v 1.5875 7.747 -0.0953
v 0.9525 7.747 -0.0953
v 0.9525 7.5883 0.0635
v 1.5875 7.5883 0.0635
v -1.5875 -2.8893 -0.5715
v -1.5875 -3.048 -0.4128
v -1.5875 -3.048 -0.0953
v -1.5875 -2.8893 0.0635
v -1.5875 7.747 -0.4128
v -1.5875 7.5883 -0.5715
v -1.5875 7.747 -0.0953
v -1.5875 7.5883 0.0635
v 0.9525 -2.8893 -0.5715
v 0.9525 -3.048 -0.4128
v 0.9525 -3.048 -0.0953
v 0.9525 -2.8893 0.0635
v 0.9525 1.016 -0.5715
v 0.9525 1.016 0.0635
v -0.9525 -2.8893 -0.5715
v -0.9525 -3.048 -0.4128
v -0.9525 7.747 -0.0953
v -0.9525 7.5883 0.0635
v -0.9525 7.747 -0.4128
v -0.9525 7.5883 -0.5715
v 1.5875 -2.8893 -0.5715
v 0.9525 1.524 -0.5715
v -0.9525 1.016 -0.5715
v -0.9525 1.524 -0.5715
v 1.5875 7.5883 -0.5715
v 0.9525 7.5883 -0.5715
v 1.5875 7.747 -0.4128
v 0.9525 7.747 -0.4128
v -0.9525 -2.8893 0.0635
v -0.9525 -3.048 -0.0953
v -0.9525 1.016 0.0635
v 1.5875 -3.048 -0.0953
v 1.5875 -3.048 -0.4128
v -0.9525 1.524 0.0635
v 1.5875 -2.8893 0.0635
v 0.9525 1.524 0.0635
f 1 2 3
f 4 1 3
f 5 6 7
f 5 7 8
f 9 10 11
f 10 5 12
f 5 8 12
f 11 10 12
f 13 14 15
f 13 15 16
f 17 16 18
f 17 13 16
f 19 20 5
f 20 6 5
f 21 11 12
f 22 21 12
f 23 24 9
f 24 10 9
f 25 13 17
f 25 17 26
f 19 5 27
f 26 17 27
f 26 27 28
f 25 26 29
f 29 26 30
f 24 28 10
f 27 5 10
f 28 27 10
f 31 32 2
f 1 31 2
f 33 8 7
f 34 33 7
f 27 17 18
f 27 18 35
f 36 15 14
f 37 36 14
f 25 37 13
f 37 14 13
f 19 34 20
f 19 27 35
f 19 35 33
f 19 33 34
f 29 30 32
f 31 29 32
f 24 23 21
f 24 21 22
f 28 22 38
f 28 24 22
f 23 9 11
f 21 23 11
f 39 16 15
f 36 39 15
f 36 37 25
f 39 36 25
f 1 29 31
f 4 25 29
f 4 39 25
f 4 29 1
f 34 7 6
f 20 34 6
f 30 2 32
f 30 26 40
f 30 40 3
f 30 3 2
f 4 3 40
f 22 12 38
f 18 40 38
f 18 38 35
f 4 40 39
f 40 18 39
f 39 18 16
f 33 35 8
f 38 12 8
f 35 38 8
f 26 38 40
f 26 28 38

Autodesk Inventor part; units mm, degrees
sketch "Sketch_2" plane through (0, 0, 0) normal (1, 0, 0) x (0, 1, 0)
  line L0 (7.5883, 0.0635) -> (-2.8893, 0.0635)
  line L1 (-2.8893, 0.0635) -> (-3.048, -0.0953)
  line L2 (-3.048, -0.0953) -> (-3.048, -0.4128)
  line L3 (-3.048, -0.4128) -> (-2.8893, -0.5715)
  line L4 (-2.8893, -0.5715) -> (7.5883, -0.5715)
  line L5 (7.5883, -0.5715) -> (7.747, -0.4128)
  line L6 (7.747, -0.4128) -> (7.747, -0.0953)
  line L7 (7.747, -0.0953) -> (7.5883, 0.0635)
extrude "Extrusion1" add sketch "Sketch_2" along normal mid plane 3.175
sketch "Sketch_10" plane through (0, 0, 0) normal (0, 0, 1) x (1, 0, 0)
  line L0 (-3.4925, -3.556) -> (4.1275, -3.556)
  line L1 (4.1275, -3.556) -> (4.1275, -3.048)
  line L2 (4.1275, -3.048) -> (3.4925, -3.048)
  line L3 (3.4925, -3.048) -> (3.4925, 1.016)
  line L4 (3.4925, 1.016) -> (1.5875, 1.016)
  line L5 (1.5875, 1.016) -> (1.5875, -3.048)
  line L6 (1.5875, -3.048) -> (0.9525, -3.048)
  line L7 (0.9525, -3.048) -> (0.9525, 1.016)
  line L8 (0.9525, 1.016) -> (-0.9525, 1.016)
  line L9 (-0.9525, 1.016) -> (-0.9525, -3.048)
  line L10 (-0.9525, -3.048) -> (-1.5875, -3.048)
  line L11 (-1.5875, -3.048) -> (-1.5875, 1.016)
  line L12 (-1.5875, 1.016) -> (-3.4925, 1.016)
  line L13 (-3.4925, 1.016) -> (-3.4925, -3.556)
extrude "Extrusion2" cut sketch "Sketch_10" along normal mid plane 6.096
sketch "Sketch_22" plane through (0, 0, 0) normal (0, 0, 1) x (1, 0, 0)
  line L0 (-3.4925, 9.652) -> (-3.4925, 1.524)
  line L1 (-3.4925, 1.524) -> (-1.5875, 1.524)
  line L2 (-1.5875, 1.524) -> (-1.5875, 9.144)
  line L3 (-1.5875, 9.144) -> (-0.9525, 9.144)
  line L4 (-0.9525, 9.144) -> (-0.9525, 1.524)
  line L5 (-0.9525, 1.524) -> (0.9525, 1.524)
  line L6 (0.9525, 1.524) -> (0.9525, 9.144)
  line L7 (0.9525, 9.144) -> (1.5875, 9.144)
  line L8 (1.5875, 9.144) -> (1.5875, 1.524)
  line L9 (1.5875, 1.524) -> (3.4925, 1.524)
  line L10 (3.4925, 1.524) -> (3.4925, 9.144)
  line L11 (3.4925, 9.144) -> (4.1275, 9.144)
  line L12 (4.1275, 9.144) -> (4.1275, 9.652)
  line L13 (4.1275, 9.652) -> (-3.4925, 9.652)
extrude "Extrusion3" cut sketch "Sketch_22" along normal mid plane 6.096
ref_plane "pins_to_header_XY" through (0, 0, 0) normal (0, 1, 0) x (1, 0, 0)
ref_plane "pins_to_header_YZ" through (0, 0, 0) normal (1, 0, 0) x (0, 0, -1)
ref_plane "pins_to_header_ZX" through (0, 0, 0) normal (0, 0, -1) x (0, 1, 0)
properties part number "T-1S64-01-02-S"
